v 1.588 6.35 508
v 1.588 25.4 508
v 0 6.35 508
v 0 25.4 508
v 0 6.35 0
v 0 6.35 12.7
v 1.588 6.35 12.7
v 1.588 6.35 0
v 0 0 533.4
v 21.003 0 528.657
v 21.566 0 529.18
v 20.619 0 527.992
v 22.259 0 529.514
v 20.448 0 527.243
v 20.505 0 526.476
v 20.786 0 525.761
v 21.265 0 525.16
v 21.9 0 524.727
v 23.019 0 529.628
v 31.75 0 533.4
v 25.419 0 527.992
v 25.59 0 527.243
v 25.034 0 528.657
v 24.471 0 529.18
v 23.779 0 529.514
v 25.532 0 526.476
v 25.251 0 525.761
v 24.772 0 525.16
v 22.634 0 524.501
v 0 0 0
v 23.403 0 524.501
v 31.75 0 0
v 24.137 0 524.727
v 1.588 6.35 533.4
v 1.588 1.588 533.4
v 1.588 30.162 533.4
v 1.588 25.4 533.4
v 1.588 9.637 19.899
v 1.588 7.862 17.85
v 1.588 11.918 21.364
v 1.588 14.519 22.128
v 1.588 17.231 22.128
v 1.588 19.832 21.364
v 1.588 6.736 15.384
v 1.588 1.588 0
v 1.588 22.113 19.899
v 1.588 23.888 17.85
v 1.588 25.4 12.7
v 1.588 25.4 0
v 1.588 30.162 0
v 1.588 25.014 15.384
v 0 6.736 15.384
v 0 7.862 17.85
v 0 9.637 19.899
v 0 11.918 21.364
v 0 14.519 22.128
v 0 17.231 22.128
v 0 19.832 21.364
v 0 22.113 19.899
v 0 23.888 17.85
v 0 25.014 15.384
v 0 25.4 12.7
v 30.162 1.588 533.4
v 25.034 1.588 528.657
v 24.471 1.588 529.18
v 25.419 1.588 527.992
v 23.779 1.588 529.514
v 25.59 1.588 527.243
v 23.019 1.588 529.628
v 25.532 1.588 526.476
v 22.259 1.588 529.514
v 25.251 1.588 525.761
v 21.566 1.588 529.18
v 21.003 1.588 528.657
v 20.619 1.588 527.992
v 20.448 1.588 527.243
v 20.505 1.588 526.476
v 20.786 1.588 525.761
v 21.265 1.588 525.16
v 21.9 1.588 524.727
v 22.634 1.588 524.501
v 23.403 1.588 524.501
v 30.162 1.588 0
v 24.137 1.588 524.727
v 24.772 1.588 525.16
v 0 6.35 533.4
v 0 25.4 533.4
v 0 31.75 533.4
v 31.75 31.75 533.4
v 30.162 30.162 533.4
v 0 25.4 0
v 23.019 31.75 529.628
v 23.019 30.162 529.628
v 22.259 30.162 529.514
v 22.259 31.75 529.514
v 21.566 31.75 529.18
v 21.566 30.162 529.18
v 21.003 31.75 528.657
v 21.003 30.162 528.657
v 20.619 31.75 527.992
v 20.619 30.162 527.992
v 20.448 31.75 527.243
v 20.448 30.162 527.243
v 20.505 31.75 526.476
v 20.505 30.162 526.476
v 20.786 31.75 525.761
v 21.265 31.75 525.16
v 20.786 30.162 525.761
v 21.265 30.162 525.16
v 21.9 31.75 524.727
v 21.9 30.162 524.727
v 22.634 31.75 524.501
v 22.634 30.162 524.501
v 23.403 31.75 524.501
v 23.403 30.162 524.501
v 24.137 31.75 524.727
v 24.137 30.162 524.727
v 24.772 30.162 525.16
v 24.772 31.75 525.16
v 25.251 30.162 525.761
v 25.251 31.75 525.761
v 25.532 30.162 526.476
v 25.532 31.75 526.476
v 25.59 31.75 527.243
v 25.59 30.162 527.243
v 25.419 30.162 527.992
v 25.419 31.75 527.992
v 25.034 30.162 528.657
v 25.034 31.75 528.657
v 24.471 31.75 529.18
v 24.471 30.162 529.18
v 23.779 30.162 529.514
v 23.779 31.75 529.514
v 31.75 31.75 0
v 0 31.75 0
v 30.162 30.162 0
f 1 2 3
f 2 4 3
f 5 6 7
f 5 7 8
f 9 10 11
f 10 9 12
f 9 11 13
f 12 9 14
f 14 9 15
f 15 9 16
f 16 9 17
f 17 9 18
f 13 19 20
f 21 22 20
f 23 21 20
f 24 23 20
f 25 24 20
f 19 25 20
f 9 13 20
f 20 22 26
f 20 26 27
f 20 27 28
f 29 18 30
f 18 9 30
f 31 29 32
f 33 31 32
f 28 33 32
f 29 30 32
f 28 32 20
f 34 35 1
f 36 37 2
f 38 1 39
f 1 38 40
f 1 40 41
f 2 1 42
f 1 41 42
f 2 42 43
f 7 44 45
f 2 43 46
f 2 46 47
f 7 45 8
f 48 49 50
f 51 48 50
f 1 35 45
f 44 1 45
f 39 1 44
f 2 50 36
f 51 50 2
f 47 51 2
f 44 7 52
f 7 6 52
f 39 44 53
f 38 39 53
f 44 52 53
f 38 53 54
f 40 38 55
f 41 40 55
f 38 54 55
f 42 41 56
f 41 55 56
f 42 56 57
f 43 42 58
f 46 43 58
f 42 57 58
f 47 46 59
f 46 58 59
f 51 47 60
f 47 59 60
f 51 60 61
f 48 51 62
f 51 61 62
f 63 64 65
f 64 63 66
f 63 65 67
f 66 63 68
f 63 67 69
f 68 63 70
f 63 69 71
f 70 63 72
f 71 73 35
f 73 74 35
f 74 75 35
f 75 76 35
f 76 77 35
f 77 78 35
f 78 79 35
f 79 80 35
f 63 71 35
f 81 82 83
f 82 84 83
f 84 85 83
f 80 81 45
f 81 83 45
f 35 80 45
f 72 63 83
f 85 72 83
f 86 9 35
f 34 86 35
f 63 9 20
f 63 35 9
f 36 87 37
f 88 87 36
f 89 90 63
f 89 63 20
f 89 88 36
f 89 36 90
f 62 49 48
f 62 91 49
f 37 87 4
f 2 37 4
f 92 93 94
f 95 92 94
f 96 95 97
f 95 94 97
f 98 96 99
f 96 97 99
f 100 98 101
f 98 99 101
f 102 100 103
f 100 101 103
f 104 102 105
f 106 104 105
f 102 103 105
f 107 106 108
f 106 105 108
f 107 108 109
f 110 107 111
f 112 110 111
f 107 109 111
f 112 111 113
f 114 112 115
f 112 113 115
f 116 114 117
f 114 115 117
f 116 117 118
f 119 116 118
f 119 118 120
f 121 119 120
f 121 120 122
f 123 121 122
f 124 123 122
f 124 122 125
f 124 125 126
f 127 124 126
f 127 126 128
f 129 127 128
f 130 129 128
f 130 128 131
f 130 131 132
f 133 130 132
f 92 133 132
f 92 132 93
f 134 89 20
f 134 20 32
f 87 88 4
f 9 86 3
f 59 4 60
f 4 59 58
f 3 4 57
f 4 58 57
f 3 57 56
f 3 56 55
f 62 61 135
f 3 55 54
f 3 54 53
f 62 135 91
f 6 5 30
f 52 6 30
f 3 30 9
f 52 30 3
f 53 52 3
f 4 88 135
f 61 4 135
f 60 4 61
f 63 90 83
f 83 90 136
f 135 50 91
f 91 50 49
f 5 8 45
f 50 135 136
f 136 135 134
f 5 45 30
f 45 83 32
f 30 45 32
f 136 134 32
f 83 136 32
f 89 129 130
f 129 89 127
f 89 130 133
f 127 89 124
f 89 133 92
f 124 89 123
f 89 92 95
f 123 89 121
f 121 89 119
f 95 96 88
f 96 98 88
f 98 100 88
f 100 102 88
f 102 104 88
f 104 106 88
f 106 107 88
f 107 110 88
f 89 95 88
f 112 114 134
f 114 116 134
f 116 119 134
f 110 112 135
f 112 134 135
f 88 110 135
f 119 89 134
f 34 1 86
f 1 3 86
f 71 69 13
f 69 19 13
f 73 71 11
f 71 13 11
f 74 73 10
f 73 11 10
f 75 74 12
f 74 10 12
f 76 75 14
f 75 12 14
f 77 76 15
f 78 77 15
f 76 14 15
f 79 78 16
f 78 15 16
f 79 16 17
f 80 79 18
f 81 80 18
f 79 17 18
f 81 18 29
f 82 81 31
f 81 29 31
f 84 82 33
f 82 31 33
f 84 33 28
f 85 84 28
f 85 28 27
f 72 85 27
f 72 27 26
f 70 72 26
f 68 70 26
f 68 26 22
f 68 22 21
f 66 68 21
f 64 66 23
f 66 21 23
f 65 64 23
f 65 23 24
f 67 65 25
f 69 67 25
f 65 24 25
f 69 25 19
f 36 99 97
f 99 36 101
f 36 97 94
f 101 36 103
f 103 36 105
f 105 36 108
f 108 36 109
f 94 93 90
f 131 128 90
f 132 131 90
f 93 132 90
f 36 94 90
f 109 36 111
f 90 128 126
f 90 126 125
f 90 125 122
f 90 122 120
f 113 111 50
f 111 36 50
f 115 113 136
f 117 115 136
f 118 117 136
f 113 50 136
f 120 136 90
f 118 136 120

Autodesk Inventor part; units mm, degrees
ref_plane "XZ Plane" through (0, 0, 0) normal (0, 1, 0) x (-1, 0, 0)
ref_plane "XY Plane" through (0, 0, 0) normal (0, 0, 1) x (1, 0, 0)
sketch "Sketch1" plane through (0, 0, 0) normal (0, 0, 1) x (1, 0, 0)
  line L0 (0, 0) -> (31.75, 0)
  line L1 (31.75, 0) -> (31.75, 31.75)
  line L2 (31.75, 31.75) -> (0, 31.75)
  line L3 (0, 31.75) -> (0, 0)
  line L4 (1.5875, 30.1625) -> (30.1625, 30.1625)
  line L5 (30.1625, 30.1625) -> (30.1625, 1.5875)
  line L6 (30.1625, 1.5875) -> (1.5875, 1.5875)
  line L7 (1.5875, 1.5875) -> (1.5875, 30.1625)
  dimension "d0" = 31.75
  dimension "d1" = 31.75
  dimension "d2" = 1.5875
extrude "Extrusion1" add sketch "Sketch1" along normal blind 533.4
sketch "Sketch5" plane through (31.75, 0, 0) normal (1, 0, 0) x (0, 0, -1)
  line L0 (0, 15.875) -> (-12.7, 15.875) construction
  line L1 (0, 6.35) -> (-12.7, 6.35)
  line L2 (-12.7, 25.4) -> (0, 25.4)
  arc A0 (0, 6.35) -> (0, 25.4) centre (0, 15.875) ccw
  arc A1 (-12.7, 25.4) -> (-12.7, 6.35) centre (-12.7, 15.875) ccw
  line L3 (0, 0) -> (0, 31.75) projected
  line L4 (0, 31.75) -> (-533.4, 31.75) projected
  point P0 (-6.35, 15.875)
  dimension "d26" = 0
  dimension "d27" = 19.05
  dimension "d28" = 15.875
  dimension "d29" = 12.7
extrude "Extrusion4" cut sketch "Sketch5" against normal blind 25.4
ref_plane "Work Plane3" through (15.875, 0, 0) normal (1, 0, 0) x (0, 1, 0)
mirror "Mirror1" about plane through (15.875, 0, 0) normal (1, 0, 0) of "Extrusion4"
sketch "Sketch6" plane through (31.75, 0, 533.4) normal (1, 0, 0) x (0, 0, -1)
  line L0 (533.4, 25.4) -> (520.7, 25.4) projected
  line L1 (533.4, 25.4) -> (520.7, 25.4)
  arc A0 (520.7, 25.4) -> (520.7, 6.35) centre (520.7, 15.875) ccw projected
  arc A1 (520.7, 25.4) -> (520.7, 6.35) centre (520.7, 15.875) ccw
  line L2 (533.4, 6.35) -> (520.7, 6.35) projected
  line L3 (520.7, 6.35) -> (533.4, 6.35)
  line L4 (533.4, 25.4) -> (533.4, 31.75) projected
  line L5 (533.4, 25.4) -> (533.4, 6.35)
  point P0 (533.4, 0)
extrude "Extrusion5" add sketch "Sketch6" against normal blind 1.5875
sketch "Sketch8" plane through (0, 31.75, 0) normal (0, 1, 0) x (1, 0, 0)
  line L0 (31.75, 0) -> (31.75, -533.4) projected
  line L1 (31.75, -533.4) -> (0, -533.4) projected
  point P0 (0, 0)
  point P1 (23.0188, -527.05)
  dimension "d44" = 8.7312
  dimension "d45" = 6.35
hole "Hole3" at (23.0187, 31.75, 527.05) direction (0, -1, 0) diameter 5.1562 depth 76.2 tip angle 118
sketch "Sketch9" plane through (0, 0, 533.4) normal (-1, 0, 0) x (0, 0, 1)
  line L0 (0, 1.5875) -> (0, 30.1625) projected
  line L1 (0, 25.4) -> (-25.4, 25.4)
  line L2 (-25.4, 25.4) -> (-25.4, 6.35)
  line L3 (-25.4, 6.35) -> (0, 6.35)
  line L4 (0, 6.35) -> (0, 25.4)
  line L5 (-533.4, 0) -> (0, 0) projected
  line L6 (-533.4, 31.75) -> (0, 31.75) projected
  dimension "d53" = 25.4
  dimension "d54" = 6.35
  dimension "d55" = 6.35
extrude "Extrusion6" cut sketch "Sketch9" against normal blind 5.842
equation "\"d55\" = d54"
properties part number "TelescopeMiddleNoSlot" material "Aluminum 6061"
